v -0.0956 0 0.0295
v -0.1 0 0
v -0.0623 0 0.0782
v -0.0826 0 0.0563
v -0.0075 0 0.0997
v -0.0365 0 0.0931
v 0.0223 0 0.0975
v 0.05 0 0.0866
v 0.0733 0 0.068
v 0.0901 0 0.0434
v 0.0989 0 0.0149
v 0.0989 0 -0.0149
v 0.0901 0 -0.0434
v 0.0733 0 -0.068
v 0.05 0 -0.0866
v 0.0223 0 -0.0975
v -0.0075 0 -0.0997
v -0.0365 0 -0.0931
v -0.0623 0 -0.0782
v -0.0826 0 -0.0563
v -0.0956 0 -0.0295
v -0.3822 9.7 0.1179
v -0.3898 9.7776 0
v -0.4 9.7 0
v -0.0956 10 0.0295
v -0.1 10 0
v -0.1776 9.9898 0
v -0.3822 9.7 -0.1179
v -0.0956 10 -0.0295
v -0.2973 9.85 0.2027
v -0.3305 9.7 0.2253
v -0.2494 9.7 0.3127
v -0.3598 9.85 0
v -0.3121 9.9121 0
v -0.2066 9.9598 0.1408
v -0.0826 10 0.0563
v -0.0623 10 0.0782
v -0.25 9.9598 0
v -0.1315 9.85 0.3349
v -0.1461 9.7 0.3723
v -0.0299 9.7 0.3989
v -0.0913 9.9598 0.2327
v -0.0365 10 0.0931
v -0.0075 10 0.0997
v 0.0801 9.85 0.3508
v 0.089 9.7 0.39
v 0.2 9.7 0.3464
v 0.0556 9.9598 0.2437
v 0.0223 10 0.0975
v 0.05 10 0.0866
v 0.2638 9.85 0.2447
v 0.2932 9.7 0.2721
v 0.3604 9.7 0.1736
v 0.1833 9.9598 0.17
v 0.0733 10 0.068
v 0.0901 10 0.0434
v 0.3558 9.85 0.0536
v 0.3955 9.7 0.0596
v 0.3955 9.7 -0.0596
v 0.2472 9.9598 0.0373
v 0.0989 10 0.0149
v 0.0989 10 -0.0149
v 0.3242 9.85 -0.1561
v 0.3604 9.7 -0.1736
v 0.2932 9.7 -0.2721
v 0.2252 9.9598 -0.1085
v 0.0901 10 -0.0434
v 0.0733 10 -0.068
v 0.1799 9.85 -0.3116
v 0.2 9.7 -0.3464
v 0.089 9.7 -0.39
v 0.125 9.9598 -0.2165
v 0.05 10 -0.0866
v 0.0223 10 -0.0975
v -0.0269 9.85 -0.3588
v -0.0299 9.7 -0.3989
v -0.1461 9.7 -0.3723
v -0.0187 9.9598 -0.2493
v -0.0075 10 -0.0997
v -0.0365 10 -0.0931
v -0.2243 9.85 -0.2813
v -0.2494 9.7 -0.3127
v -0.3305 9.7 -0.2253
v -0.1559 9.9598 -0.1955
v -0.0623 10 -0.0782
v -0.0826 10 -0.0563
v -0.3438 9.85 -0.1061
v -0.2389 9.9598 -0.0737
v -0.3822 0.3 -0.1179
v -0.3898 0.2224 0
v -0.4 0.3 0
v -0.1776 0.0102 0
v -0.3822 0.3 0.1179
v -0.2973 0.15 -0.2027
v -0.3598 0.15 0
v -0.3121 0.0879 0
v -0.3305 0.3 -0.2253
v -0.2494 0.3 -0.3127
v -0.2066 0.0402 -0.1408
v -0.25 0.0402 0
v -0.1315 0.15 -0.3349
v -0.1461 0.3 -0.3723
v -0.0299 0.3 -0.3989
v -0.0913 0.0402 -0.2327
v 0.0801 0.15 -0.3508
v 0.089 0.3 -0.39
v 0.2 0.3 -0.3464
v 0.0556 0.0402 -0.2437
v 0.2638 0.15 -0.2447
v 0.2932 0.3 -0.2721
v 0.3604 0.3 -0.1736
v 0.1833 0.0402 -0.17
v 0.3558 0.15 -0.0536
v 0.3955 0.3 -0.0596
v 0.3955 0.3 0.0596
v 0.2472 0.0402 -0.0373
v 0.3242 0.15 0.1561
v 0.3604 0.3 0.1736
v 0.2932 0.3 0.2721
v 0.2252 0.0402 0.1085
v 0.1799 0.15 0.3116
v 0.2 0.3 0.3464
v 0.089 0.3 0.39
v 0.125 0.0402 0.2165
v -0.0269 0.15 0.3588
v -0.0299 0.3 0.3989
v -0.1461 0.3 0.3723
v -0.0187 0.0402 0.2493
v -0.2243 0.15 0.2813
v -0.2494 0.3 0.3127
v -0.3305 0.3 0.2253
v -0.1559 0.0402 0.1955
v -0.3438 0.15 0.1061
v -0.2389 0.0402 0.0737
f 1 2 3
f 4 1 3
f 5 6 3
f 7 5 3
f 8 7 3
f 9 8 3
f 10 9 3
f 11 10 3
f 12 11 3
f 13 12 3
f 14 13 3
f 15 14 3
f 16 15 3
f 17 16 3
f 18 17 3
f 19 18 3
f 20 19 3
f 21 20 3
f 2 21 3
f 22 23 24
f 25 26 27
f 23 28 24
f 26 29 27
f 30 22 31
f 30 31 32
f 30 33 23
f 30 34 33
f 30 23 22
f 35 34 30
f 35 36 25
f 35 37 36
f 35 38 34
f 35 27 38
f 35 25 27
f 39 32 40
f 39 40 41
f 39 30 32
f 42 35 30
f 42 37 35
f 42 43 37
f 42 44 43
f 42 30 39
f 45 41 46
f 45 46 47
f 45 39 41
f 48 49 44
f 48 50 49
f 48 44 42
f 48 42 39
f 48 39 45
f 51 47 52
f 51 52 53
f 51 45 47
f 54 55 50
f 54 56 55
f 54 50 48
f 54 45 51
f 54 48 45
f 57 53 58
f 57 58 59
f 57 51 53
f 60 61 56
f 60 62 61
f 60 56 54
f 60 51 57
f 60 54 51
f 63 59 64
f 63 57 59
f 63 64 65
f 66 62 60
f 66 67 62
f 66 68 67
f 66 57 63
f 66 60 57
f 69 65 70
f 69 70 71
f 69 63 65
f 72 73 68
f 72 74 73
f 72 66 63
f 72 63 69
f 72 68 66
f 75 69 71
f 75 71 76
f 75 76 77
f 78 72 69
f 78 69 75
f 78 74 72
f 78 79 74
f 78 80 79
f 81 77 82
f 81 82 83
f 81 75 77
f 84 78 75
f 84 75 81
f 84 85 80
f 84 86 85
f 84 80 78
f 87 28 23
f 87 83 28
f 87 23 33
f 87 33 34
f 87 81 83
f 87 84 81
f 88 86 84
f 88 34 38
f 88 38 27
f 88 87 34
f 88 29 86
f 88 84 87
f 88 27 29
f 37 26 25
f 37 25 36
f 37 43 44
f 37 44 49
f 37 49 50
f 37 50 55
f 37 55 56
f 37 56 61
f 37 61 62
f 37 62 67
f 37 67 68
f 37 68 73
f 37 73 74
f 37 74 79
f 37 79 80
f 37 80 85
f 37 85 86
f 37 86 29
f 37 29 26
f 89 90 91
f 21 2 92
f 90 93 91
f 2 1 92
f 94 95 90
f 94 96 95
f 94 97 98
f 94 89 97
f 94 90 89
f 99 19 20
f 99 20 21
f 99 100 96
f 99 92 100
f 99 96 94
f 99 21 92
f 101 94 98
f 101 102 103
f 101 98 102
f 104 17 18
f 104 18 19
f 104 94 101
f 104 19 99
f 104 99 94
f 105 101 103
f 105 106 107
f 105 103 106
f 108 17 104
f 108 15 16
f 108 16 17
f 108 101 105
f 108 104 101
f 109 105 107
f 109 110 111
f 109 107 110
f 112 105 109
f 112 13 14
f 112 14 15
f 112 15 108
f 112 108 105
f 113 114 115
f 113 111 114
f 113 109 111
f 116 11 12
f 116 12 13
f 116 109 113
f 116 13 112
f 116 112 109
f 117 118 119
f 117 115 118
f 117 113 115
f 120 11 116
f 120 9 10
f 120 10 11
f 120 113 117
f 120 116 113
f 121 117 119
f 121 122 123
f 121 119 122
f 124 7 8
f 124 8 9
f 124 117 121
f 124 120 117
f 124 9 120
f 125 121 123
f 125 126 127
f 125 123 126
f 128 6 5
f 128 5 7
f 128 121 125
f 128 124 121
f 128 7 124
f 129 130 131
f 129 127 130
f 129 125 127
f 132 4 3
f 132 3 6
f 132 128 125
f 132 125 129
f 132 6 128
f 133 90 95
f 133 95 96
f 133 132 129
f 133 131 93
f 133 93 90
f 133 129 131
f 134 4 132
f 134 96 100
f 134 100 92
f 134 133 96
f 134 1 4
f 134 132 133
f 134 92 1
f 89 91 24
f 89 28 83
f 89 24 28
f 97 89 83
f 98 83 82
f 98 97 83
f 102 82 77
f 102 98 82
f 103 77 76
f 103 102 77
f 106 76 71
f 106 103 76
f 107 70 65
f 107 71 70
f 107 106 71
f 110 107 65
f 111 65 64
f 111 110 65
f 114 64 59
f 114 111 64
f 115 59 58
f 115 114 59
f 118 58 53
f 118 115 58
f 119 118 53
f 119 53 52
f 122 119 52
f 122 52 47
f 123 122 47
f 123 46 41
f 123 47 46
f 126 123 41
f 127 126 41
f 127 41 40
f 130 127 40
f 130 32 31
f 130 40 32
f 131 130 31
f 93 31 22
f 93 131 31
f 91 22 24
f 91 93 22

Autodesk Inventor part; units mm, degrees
ref_plane "YZ Plane" through (0, 0, 0) normal (1, 0, 0) x (0, 1, 0)
ref_plane "XZ Plane" through (0, 0, 0) normal (0, 1, 0) x (-1, 0, 0)
ref_plane "XY Plane" through (0, 0, 0) normal (0, 0, 1) x (1, 0, 0)
sketch "草图1" plane through (0, 0, 0) normal (0, 1, 0) x (-1, 0, 0)
  circle A0 centre (0, 0) radius 0.4
  dimension "d0" = 0.8
extrude "拉伸1" add sketch "草图1" along normal blind 10
fillet "圆角1" radius 0.3 1 edges at (0.4, 10, 0)
fillet "圆角2" radius 0.3 1 edges at (0.4, 0, 0)
properties part number "top"
